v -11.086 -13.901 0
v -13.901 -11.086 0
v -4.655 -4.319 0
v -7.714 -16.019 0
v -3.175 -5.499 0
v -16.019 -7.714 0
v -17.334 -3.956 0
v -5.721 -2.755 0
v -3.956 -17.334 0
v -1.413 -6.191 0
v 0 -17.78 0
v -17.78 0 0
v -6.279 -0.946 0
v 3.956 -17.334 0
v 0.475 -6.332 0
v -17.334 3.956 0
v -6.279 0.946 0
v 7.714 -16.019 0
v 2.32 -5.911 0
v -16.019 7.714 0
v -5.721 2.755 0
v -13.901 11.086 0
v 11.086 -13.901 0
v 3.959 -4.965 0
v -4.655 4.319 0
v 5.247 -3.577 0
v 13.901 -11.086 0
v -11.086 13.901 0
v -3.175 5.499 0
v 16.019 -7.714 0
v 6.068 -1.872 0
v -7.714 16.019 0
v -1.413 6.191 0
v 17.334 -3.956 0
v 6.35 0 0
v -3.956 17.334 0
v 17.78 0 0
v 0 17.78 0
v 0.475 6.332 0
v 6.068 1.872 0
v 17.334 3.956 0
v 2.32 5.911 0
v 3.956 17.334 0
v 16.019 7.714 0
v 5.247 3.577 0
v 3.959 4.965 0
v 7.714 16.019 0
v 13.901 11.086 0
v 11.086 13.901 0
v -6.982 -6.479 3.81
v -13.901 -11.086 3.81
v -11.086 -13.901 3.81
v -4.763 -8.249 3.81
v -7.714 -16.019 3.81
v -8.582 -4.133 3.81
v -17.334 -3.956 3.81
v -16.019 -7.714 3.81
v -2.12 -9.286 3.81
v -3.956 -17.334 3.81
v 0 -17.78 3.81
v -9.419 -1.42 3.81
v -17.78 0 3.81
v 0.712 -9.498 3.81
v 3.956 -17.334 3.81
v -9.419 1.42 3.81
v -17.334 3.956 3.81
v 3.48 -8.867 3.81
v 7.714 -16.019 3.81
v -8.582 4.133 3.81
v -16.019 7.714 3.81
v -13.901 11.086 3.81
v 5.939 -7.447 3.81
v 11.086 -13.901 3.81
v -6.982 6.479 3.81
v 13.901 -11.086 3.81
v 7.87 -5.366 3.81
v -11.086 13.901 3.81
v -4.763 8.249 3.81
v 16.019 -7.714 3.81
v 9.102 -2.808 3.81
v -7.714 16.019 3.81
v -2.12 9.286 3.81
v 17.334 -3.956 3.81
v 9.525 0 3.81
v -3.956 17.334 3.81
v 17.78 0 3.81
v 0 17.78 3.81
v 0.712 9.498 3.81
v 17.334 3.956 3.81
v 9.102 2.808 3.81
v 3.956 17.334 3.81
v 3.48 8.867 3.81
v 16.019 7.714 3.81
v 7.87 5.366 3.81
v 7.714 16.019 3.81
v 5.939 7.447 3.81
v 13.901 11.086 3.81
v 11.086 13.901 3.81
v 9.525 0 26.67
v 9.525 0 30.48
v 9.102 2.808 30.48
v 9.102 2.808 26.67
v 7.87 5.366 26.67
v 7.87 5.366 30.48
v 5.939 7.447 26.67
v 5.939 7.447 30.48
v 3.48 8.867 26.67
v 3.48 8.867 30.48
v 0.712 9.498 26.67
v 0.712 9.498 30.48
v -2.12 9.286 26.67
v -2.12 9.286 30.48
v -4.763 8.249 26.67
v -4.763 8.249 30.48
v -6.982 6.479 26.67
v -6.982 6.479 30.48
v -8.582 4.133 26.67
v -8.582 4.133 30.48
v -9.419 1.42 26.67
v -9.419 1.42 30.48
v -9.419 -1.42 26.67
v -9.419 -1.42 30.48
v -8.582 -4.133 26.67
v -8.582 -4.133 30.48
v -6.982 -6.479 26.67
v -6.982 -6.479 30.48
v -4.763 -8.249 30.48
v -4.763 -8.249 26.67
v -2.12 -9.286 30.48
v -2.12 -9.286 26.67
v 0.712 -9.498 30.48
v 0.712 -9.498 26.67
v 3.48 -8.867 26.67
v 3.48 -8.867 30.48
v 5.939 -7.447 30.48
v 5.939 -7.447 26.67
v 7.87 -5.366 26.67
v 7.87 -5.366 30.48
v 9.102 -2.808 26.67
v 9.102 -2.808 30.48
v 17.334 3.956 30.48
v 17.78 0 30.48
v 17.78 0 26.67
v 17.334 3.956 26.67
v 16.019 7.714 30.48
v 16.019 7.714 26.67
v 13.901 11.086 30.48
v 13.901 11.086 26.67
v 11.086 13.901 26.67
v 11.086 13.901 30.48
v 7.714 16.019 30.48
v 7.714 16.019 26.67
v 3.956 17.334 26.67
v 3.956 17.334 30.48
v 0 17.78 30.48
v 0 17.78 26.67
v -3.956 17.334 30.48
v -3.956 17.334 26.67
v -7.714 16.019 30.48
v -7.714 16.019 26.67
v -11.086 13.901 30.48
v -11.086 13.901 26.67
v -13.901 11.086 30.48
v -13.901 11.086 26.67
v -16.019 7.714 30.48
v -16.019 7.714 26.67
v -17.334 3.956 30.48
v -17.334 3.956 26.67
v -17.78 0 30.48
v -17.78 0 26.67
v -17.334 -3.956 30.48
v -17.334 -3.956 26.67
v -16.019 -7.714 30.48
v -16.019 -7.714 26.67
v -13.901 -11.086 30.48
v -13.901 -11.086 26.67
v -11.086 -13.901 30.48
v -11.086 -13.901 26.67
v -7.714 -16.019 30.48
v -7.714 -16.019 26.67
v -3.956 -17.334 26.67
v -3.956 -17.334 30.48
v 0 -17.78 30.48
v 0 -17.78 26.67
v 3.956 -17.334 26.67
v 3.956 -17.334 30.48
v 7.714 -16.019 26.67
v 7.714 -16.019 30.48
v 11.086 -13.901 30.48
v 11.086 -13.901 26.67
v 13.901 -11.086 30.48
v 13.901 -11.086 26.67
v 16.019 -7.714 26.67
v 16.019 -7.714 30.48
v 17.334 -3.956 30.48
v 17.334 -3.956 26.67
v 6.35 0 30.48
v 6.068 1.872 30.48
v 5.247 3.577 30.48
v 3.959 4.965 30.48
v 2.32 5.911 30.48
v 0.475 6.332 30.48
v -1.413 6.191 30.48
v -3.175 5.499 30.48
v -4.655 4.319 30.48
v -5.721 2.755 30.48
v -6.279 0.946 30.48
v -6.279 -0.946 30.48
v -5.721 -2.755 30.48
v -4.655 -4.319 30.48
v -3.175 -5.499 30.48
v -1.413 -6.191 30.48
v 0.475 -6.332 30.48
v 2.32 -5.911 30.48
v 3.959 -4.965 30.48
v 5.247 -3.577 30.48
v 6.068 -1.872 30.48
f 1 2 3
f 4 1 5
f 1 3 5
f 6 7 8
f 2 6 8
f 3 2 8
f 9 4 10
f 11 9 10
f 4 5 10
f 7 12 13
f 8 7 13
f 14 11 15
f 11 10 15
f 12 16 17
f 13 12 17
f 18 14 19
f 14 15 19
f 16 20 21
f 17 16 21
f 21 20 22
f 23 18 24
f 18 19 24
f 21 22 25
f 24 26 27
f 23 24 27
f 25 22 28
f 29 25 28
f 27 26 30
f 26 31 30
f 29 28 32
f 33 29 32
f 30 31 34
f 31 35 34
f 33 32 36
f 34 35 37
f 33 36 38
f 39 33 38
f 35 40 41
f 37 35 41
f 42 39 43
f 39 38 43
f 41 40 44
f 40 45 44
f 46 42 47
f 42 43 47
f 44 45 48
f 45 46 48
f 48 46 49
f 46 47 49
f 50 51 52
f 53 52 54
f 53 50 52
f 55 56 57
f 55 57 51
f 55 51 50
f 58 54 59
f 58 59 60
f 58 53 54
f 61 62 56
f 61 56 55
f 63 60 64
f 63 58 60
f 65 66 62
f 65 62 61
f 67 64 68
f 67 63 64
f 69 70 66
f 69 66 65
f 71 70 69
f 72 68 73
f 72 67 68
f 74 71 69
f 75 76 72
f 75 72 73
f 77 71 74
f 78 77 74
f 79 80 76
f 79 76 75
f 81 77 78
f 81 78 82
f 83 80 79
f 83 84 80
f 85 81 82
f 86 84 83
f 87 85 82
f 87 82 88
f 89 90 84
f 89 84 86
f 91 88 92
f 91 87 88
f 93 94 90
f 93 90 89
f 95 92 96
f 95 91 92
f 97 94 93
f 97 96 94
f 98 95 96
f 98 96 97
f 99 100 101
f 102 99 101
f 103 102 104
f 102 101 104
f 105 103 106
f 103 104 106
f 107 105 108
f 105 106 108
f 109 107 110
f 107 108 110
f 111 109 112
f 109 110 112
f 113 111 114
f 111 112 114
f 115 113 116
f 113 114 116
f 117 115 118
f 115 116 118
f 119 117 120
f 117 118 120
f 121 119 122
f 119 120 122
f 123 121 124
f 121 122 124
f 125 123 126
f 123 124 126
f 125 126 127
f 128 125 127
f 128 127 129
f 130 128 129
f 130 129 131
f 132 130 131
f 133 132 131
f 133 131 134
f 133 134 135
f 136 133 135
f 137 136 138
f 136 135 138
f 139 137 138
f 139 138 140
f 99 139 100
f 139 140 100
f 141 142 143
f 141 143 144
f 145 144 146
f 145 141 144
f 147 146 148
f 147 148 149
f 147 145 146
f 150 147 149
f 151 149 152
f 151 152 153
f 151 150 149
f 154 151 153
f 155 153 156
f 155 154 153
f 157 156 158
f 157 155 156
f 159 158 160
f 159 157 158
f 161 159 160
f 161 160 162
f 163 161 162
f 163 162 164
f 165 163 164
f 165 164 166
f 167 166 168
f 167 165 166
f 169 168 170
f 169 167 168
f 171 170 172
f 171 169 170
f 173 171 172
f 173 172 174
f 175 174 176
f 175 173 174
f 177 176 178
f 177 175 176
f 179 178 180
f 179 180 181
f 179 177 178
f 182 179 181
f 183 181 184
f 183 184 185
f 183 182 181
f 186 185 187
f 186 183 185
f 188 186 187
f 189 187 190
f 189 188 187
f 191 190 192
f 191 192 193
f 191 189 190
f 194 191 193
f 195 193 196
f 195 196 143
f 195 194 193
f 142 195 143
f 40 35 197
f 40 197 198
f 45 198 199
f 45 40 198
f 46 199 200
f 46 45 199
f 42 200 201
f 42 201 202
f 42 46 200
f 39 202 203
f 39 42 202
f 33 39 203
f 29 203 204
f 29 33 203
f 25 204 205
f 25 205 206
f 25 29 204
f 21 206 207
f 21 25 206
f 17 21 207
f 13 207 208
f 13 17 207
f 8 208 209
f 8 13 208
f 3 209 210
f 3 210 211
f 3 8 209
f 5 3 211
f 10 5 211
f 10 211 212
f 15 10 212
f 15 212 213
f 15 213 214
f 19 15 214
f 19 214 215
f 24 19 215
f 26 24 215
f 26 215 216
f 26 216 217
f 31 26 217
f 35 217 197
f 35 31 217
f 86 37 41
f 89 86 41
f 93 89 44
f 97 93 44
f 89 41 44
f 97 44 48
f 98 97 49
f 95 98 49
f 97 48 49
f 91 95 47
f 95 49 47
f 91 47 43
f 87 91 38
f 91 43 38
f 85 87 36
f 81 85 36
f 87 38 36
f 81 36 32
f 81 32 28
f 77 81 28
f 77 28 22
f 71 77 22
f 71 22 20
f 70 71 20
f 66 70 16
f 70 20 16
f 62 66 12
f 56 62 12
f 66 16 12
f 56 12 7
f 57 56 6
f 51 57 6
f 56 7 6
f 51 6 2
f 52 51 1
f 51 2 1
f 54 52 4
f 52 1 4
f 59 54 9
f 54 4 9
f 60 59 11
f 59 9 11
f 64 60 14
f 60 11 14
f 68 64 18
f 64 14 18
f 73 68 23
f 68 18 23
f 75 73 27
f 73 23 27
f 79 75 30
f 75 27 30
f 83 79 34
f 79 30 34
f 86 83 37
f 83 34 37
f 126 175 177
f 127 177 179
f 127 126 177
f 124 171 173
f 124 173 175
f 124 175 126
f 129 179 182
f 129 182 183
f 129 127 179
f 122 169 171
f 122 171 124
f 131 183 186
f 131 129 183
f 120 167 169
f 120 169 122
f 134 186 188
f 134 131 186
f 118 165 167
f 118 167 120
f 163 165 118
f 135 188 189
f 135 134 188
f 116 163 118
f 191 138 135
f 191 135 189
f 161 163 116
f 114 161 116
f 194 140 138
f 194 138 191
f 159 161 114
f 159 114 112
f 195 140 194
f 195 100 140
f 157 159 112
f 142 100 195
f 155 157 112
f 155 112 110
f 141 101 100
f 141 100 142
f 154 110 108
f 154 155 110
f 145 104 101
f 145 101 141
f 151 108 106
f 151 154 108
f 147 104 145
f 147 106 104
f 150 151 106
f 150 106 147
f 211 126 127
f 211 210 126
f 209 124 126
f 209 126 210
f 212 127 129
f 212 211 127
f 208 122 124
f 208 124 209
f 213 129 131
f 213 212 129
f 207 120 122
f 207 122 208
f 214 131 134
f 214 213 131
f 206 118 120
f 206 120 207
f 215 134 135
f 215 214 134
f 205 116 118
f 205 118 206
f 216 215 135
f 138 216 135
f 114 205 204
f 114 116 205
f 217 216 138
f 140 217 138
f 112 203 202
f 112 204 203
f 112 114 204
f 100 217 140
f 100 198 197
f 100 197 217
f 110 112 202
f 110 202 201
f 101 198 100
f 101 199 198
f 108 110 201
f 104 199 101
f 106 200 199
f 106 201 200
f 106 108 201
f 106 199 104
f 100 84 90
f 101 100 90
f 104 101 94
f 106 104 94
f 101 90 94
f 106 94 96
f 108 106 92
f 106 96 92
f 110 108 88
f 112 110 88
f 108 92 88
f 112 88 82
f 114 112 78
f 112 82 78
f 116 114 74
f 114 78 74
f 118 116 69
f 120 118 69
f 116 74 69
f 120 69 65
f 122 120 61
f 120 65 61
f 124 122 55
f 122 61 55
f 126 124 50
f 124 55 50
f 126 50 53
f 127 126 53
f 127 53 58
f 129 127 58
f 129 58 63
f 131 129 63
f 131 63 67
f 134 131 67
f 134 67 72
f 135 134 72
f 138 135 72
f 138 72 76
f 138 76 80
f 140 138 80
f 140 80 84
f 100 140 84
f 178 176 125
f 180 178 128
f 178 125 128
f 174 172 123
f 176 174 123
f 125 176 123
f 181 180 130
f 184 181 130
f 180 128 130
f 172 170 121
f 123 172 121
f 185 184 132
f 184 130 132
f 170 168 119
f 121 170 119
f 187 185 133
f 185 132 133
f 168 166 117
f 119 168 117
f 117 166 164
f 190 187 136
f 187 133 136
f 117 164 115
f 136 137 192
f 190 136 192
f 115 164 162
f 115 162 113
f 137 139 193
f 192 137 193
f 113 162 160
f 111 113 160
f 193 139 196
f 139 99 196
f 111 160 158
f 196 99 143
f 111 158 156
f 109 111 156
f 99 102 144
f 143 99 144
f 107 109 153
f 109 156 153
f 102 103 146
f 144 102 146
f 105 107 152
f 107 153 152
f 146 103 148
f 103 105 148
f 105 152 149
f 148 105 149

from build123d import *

# Parameters (mm, degrees)
F0_R     = 17.78
F0_R_2   = 9.525
F1_DEPTH = 3.81
F0_R_3   = 6.35
F2_DEPTH = 30.48
F3_R     = 17.78
F3_R_2   = 9.525
F4_DEPTH = 3.81


with BuildPart() as f1:
    # F0 (on Top) → F1 (new body)
    with BuildSketch(Plane.XY):
        Circle(F0_R)
        Circle(F0_R_2, mode=Mode.SUBTRACT)
    extrude(amount=F1_DEPTH)

    # F0 (on Top) → F2 (join)
    with BuildSketch(Plane.XY):
        Circle(F0_R_2)
        Circle(F0_R_3, mode=Mode.SUBTRACT)
    extrude(amount=F2_DEPTH)


with BuildPart() as f4:
    # F3 (on face) → F4 (new body)
    with BuildSketch(Plane.XY.offset(30.48)):
        Circle(F3_R)
        Circle(F3_R_2, mode=Mode.SUBTRACT)
    extrude(amount=-F4_DEPTH)


solid = Compound([f1.part, f4.part])
